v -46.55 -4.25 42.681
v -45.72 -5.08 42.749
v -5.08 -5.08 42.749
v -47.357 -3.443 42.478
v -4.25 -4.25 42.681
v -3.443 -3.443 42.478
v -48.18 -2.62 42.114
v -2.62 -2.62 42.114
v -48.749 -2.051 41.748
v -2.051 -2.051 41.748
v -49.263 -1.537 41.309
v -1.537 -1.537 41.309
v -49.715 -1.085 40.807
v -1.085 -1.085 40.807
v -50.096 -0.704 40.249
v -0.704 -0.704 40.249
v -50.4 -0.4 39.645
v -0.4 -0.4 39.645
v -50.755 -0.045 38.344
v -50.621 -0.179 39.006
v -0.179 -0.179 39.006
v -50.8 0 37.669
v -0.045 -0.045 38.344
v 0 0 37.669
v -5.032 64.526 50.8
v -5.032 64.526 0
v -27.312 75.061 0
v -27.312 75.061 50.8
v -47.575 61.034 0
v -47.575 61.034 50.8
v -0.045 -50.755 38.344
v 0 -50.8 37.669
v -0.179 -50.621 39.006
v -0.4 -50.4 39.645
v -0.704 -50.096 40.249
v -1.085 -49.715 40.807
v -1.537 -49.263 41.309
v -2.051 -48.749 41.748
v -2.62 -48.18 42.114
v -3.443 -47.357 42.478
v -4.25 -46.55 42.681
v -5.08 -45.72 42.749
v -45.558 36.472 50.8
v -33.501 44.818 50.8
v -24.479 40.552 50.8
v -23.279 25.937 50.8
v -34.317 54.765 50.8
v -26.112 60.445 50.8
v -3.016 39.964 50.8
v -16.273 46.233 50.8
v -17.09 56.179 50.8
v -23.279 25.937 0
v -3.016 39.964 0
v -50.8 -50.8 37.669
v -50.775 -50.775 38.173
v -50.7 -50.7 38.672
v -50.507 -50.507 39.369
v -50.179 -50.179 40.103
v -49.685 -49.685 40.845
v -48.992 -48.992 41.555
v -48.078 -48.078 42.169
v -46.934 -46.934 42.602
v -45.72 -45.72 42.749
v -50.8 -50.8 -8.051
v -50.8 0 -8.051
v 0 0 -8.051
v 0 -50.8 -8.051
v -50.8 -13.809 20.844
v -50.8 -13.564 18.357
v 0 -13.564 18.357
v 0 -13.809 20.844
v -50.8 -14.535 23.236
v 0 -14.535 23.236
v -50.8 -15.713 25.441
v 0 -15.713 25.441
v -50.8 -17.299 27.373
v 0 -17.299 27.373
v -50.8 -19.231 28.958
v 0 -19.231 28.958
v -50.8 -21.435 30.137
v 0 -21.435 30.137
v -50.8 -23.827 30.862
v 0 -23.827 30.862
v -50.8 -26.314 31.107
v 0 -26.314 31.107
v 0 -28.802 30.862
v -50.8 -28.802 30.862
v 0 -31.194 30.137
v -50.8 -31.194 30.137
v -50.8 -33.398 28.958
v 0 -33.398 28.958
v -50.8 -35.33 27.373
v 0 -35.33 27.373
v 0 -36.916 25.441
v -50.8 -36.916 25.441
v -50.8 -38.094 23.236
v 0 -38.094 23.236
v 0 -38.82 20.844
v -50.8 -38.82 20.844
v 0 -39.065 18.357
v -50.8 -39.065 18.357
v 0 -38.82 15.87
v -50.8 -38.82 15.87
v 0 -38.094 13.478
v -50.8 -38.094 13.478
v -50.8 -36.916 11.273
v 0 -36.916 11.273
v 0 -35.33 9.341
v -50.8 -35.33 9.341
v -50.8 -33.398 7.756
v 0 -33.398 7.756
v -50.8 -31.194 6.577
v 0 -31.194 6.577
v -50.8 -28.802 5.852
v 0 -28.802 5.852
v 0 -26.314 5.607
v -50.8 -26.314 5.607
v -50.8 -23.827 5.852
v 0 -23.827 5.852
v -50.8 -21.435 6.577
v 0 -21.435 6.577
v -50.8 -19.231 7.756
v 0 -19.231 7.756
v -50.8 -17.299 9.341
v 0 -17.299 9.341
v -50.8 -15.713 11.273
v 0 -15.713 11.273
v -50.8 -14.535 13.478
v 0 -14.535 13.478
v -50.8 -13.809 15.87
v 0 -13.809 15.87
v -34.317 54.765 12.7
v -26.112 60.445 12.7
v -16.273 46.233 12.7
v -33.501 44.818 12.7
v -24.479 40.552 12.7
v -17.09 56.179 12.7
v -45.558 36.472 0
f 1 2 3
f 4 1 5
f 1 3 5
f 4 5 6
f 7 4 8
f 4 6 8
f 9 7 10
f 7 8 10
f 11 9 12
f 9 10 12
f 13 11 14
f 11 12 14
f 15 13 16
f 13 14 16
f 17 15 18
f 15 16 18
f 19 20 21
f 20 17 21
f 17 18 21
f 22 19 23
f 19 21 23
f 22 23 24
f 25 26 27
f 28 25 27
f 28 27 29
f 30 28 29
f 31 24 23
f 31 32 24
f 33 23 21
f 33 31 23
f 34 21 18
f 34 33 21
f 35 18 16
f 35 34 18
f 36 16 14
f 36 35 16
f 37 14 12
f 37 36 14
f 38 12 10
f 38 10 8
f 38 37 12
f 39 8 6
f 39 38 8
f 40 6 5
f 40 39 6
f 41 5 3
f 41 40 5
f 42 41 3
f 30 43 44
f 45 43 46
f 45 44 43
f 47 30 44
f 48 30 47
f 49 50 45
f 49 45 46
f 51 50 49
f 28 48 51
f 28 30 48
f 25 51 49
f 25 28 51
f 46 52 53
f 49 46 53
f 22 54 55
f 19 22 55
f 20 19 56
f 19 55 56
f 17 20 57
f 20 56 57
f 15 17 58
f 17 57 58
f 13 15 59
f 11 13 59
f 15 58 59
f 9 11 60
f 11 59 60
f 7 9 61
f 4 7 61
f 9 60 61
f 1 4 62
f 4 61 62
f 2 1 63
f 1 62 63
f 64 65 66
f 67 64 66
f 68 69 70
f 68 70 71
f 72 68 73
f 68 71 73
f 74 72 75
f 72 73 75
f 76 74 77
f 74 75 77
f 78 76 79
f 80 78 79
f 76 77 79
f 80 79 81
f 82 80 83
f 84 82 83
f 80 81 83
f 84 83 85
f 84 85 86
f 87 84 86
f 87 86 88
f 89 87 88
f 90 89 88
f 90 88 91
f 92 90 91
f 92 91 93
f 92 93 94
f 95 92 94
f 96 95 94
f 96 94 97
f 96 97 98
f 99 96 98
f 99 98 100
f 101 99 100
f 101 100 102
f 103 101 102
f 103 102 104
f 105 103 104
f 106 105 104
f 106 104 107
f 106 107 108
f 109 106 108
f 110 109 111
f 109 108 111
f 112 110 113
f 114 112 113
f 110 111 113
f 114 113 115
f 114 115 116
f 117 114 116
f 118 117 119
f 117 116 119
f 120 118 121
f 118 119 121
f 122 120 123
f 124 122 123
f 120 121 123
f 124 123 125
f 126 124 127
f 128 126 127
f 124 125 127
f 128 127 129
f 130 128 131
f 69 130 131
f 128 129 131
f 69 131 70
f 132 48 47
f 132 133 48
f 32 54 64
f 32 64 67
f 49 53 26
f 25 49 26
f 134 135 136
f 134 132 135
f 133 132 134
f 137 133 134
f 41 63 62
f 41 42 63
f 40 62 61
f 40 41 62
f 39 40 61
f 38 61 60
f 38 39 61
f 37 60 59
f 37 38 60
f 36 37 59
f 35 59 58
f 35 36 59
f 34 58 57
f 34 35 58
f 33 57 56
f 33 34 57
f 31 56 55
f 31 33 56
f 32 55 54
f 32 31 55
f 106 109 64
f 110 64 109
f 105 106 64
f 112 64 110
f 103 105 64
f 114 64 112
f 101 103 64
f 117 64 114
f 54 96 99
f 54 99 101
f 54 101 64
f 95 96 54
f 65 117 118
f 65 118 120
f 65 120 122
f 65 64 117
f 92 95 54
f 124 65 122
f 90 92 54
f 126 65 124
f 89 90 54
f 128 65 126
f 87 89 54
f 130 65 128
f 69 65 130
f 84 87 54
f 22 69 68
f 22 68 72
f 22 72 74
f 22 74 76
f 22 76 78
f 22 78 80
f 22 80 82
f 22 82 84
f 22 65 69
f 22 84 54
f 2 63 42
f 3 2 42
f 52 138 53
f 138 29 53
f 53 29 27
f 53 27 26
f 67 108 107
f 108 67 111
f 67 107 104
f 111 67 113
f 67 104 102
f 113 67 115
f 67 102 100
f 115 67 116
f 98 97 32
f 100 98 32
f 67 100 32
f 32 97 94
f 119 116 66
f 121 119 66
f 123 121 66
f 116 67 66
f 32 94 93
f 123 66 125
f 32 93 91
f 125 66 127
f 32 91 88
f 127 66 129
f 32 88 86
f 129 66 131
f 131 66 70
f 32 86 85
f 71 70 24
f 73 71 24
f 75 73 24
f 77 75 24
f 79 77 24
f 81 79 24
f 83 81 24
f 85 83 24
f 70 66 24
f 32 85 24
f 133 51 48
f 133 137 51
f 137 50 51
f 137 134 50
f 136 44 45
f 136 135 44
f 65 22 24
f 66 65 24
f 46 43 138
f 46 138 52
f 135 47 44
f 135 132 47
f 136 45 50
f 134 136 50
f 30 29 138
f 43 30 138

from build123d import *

# Parameters (mm, degrees)
F0_W     = 50.8
F0_H     = 50.8
F1_DEPTH = 50.8
F2_R     = 5.08
F3_R     = 12.750154
F4_DEPTH = 50.801
F6_DEPTH = 50.8
F7_T     = -12.7


with BuildPart() as f1:
    # F0 (on Front) → F1 (new body)
    with BuildSketch(Plane.XZ):
        with Locations((-25.4, 17.349255)):
            Rectangle(F0_W, F0_H)
    extrude(amount=F1_DEPTH)

    # F2
    f2_edges = [f1.edges().sort_by_distance(p)[0] for p in [
        (0, -25.4, 42.749255),
        (-25.4, -50.8, 42.749255),
        (-50.8, -25.4, 42.749255),
        (-25.4, 0, 42.749255),
    ]]
    fillet(f2_edges, radius=F2_R)

    # F3 (on face) → F4 (cut, through all)
    with BuildSketch(Plane.YZ):
        with Locations((-26.314387, 18.357068)):
            Circle(F3_R)
    extrude(amount=-F4_DEPTH, mode=Mode.SUBTRACT)


with BuildPart() as f6:
    # F5 (on Top) → F6 (new body)
    with BuildSketch(Plane.XY):
        Polygon((-45.558483, 36.471677), (-23.278968, 25.936803), (-3.015743, 39.963992), (-5.032032, 64.526055), (-27.311547, 75.060928), (-47.574772, 61.033739), align=None)
    extrude(amount=F6_DEPTH)

    # F7
    f7_openings = [f6.faces().sort_by_distance(p)[0] for p in [
        (-25.295258, 50.498866, 50.8),
    ]]
    offset(amount=F7_T, openings=f7_openings)


solid = Compound([f1.part, f6.part])
